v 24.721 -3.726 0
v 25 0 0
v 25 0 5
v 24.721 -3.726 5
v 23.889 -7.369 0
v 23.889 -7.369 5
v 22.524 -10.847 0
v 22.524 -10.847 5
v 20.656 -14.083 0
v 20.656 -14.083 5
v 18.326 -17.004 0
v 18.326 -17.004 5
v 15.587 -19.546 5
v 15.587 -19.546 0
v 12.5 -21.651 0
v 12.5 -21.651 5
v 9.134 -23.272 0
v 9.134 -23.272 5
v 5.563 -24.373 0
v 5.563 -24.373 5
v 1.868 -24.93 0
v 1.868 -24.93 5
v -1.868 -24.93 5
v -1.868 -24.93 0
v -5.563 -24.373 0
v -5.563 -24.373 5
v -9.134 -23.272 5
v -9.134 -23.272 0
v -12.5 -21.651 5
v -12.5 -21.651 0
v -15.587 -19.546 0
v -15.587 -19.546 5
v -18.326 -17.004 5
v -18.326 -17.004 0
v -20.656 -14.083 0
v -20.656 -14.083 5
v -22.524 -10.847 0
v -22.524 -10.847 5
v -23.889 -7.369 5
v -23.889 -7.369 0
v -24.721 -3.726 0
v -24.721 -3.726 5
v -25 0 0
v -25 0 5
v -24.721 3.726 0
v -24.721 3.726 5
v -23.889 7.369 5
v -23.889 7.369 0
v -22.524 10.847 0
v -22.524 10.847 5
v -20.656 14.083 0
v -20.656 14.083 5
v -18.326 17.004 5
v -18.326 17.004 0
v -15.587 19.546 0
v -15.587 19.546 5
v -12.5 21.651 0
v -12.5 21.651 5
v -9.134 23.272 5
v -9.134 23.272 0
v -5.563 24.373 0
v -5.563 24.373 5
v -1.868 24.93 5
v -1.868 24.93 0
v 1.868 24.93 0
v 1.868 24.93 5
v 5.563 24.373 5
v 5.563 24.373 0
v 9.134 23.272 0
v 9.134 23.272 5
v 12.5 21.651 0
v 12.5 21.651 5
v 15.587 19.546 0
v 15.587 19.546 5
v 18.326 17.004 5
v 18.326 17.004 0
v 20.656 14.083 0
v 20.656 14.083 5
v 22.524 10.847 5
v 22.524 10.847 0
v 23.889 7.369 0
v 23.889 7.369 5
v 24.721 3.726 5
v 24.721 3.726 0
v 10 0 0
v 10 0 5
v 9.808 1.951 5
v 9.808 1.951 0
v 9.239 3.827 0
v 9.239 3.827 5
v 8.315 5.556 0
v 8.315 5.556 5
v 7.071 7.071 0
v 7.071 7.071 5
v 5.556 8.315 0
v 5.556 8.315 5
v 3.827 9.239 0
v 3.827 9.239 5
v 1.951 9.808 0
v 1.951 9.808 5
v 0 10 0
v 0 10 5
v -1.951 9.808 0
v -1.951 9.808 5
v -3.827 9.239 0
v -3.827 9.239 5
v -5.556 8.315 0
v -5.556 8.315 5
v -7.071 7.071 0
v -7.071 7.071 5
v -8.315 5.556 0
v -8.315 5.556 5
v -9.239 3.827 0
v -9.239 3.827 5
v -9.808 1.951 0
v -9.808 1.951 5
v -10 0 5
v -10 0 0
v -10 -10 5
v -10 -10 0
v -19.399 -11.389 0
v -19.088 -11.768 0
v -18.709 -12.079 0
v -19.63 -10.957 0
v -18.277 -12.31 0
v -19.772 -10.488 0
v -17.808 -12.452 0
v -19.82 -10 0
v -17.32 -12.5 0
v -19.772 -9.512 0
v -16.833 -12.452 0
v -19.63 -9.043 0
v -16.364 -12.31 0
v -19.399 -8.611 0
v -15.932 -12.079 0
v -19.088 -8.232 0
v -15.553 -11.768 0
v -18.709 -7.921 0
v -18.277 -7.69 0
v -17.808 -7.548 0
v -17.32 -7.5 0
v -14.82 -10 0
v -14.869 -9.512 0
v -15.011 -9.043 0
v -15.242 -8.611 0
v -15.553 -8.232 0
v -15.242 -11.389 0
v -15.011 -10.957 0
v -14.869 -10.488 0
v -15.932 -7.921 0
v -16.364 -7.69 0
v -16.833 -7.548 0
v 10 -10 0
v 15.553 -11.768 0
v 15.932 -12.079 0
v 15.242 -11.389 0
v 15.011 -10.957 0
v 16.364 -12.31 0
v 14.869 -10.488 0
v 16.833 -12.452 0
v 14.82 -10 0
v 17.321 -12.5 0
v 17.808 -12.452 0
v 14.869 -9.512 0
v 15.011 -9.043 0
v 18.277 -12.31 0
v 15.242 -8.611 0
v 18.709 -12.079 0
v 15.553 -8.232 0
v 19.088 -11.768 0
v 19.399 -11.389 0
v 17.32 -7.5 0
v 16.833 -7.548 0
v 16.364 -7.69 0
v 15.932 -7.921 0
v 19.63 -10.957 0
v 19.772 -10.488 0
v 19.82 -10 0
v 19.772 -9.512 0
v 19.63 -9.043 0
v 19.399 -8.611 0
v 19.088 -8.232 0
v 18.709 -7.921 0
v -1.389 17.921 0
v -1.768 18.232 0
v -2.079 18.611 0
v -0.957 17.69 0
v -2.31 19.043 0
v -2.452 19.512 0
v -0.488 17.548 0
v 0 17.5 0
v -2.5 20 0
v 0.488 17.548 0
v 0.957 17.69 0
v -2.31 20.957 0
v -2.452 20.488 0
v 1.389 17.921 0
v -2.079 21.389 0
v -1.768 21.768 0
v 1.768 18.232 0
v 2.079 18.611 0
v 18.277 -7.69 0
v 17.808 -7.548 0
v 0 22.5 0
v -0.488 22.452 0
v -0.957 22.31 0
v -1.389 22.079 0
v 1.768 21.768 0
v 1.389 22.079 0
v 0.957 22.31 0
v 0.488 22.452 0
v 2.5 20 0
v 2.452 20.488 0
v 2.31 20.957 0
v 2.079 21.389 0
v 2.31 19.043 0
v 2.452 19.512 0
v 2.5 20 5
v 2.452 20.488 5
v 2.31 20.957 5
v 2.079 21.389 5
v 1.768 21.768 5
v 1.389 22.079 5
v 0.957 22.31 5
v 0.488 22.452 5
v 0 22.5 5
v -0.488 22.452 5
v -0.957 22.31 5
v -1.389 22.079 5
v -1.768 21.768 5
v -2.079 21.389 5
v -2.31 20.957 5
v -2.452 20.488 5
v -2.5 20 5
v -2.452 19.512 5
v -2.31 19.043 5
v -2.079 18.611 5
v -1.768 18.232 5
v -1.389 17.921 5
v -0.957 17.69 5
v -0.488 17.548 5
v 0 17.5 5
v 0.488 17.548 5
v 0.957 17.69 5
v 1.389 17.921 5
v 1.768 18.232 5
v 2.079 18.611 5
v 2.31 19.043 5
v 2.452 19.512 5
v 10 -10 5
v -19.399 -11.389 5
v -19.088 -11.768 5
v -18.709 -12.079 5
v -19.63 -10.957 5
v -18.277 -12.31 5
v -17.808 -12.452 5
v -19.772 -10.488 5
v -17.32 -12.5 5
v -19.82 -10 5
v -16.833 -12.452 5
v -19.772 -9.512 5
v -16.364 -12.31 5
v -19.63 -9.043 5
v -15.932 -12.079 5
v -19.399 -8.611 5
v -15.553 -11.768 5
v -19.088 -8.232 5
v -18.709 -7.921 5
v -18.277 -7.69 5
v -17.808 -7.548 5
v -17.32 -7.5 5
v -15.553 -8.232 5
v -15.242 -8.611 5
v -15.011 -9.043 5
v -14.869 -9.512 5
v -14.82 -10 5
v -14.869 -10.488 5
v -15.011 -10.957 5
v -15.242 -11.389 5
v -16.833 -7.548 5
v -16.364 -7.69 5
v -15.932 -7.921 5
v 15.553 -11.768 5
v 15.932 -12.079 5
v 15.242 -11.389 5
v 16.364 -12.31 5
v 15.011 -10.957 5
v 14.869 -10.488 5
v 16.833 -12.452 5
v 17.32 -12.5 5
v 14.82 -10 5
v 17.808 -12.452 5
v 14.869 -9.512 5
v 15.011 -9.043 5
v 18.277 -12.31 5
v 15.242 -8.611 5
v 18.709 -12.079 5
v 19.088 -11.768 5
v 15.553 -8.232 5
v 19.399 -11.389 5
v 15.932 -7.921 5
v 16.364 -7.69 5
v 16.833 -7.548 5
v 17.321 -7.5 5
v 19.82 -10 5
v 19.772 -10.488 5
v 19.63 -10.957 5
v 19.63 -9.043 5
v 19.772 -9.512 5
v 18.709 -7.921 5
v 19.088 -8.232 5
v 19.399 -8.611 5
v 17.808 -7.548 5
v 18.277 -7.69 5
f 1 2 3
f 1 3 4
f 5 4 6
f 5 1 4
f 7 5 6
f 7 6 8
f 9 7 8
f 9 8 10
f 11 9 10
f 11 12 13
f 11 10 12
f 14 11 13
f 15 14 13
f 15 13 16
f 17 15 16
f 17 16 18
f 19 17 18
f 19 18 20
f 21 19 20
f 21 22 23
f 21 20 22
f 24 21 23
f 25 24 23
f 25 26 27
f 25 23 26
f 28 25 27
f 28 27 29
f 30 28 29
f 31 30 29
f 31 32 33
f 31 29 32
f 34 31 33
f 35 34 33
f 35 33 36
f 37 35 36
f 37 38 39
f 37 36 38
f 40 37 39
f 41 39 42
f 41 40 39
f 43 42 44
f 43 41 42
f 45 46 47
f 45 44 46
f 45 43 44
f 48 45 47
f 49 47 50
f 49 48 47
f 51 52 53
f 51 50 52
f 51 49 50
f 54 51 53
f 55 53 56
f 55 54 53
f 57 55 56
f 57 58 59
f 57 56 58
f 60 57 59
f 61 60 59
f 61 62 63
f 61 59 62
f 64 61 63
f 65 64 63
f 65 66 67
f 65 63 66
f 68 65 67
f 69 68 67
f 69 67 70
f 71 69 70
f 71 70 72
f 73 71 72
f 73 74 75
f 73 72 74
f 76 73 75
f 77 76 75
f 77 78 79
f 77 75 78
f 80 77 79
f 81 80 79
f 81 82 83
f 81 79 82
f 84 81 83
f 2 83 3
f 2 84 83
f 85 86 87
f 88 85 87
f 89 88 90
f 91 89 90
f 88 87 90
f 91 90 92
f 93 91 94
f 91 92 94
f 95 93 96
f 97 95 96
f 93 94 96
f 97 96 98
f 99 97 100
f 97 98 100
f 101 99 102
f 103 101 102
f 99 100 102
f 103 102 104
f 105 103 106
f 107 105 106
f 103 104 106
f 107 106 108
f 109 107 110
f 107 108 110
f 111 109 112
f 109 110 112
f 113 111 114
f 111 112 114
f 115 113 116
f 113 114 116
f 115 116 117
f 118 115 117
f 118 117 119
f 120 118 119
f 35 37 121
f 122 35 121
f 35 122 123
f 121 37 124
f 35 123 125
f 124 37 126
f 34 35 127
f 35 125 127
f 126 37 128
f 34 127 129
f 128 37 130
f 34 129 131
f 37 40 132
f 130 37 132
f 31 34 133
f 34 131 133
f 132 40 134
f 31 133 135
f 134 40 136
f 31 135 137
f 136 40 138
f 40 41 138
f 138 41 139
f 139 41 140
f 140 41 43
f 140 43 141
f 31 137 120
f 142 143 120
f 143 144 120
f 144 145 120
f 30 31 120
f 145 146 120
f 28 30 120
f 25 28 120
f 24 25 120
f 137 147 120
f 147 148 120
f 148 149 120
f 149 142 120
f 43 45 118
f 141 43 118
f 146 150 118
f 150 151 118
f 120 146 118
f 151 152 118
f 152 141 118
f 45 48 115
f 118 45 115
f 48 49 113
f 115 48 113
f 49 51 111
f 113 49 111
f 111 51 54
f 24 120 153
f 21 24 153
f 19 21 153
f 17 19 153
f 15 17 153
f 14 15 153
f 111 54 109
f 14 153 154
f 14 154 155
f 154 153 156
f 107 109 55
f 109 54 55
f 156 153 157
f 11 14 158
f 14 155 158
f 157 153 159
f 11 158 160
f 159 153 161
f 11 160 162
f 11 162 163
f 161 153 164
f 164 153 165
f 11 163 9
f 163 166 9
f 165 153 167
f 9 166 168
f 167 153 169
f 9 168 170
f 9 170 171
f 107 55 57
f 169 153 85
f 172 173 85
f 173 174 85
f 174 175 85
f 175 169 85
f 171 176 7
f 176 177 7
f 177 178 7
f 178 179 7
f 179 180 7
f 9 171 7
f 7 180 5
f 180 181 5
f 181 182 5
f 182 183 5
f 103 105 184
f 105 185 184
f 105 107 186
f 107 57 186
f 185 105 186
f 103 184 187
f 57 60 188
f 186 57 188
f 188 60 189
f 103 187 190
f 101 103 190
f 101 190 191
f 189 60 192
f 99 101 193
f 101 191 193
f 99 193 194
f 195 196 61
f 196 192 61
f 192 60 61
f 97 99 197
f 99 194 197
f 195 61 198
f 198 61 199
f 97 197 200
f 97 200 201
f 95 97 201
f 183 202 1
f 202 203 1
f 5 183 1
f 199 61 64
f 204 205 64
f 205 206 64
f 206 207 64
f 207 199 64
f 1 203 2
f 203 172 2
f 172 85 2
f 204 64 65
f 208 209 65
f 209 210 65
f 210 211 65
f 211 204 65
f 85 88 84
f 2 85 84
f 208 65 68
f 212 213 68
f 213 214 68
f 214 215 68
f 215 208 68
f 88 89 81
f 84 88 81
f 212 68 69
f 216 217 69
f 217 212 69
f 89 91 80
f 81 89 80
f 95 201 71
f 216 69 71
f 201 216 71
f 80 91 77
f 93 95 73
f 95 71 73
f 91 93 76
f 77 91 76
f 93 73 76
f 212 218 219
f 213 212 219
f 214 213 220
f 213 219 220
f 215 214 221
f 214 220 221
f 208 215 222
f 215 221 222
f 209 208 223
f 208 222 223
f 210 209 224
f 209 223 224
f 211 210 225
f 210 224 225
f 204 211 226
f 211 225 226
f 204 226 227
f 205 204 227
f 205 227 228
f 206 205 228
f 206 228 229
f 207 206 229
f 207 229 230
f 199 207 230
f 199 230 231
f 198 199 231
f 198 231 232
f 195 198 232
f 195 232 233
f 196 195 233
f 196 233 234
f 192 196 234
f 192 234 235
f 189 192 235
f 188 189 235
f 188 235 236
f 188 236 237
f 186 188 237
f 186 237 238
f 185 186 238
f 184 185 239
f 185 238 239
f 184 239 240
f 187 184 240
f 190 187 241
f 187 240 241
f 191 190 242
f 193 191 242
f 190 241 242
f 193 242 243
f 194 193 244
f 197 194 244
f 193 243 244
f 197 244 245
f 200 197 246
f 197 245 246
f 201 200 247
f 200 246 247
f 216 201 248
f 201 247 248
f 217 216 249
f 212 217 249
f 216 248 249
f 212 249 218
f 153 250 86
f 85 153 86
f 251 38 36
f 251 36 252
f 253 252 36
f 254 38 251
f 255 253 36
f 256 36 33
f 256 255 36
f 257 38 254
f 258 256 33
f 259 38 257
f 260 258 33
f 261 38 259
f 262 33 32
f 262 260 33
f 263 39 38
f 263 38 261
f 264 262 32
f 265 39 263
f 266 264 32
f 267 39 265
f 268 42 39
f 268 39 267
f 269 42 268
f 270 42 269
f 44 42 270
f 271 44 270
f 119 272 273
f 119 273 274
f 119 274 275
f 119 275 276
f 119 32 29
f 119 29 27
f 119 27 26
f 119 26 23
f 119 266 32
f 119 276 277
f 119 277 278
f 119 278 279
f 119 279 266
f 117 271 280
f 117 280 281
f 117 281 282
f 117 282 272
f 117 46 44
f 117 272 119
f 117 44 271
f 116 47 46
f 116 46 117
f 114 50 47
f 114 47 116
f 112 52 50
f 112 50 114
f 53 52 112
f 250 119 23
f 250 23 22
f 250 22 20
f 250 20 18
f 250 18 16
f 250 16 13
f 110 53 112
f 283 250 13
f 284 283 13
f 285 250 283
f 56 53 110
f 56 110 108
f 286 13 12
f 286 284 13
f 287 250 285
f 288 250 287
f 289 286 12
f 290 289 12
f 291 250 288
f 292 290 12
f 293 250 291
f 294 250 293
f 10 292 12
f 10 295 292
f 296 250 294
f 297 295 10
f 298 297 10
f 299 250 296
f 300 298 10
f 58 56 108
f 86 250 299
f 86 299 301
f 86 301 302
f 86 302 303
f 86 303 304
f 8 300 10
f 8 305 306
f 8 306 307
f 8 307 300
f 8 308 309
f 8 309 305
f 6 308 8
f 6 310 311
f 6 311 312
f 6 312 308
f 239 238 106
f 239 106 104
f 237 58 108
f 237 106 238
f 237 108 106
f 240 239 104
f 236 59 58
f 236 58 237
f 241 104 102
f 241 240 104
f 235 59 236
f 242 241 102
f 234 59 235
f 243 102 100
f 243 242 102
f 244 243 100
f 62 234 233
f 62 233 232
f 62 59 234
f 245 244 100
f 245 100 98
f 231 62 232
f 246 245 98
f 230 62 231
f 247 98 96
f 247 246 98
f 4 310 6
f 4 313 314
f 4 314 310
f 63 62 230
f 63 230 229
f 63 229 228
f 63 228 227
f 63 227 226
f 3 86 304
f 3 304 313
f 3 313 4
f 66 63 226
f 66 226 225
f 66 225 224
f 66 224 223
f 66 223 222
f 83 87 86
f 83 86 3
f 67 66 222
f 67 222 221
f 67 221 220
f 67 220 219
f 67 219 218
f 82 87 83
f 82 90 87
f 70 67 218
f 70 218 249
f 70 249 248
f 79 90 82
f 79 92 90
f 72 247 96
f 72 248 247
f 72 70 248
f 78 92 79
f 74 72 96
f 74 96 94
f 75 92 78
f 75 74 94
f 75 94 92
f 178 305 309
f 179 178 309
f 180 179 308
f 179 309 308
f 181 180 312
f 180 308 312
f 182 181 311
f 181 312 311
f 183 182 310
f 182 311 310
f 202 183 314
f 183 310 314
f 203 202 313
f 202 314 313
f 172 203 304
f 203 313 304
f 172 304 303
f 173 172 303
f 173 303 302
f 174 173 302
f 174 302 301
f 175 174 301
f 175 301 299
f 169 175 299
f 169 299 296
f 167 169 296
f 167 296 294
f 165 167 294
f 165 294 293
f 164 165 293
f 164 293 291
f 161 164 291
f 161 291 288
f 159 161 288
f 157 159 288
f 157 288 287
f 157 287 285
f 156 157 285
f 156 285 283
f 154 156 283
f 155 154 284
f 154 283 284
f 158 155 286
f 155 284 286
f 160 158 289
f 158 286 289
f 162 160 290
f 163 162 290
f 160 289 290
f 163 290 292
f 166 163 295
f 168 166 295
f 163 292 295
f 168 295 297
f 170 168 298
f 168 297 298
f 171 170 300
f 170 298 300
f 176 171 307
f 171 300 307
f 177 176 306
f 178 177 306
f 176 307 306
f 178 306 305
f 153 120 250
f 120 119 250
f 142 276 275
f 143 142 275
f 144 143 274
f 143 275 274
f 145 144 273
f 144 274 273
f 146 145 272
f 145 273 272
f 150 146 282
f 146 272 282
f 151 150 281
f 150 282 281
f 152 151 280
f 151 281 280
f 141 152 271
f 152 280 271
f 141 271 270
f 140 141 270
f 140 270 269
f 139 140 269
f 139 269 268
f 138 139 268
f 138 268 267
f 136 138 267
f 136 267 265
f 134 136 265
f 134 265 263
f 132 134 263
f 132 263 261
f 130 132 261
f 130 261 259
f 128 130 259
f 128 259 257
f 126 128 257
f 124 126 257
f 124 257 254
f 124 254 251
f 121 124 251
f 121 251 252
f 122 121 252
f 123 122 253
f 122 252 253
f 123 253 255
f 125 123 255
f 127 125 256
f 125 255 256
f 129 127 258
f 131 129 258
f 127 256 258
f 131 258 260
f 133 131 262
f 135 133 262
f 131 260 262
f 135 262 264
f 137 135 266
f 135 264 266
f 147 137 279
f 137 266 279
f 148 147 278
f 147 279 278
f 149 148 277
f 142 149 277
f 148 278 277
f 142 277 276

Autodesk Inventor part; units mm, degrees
ref_plane "YZ Plane" through (0, 0, 0) normal (1, 0, 0) x (0, 1, 0)
ref_plane "XZ Plane" through (0, 0, 0) normal (0, 1, 0) x (-1, 0, 0)
ref_plane "XY Plane" through (0, 0, 0) normal (0, 0, 1) x (1, 0, 0)
sketch "草图1" plane through (0, 0, 0) normal (0, 0, 1) x (1, 0, 0)
  circle A0 centre (0, 0) radius 25
  dimension "d0" = 50
extrude "拉伸1" add sketch "草图1" along normal blind 5
sketch "草图2" plane through (0, 0, 5) normal (0, 0, 1) x (1, 0, 0)
  circle A0 centre (0, 0) radius 10
  line L0 (-10, 0) -> (-10, -10)
  line L1 (-10, -10) -> (10, -10)
  line L2 (10, -10) -> (10, 0)
  dimension "d3" = 20
extrude "拉伸2" cut sketch "草图2" against normal through all
sketch "草图3" plane through (0, 0, 5) normal (0, 0, 1) x (1, 0, 0)
  circle A0 centre (-17.3205, -10) radius 2.5
  circle A1 centre (17.3205, -10) radius 2.5
  circle A2 centre (0, 20) radius 2.5
  line L0 (0, 0) -> (0, 20)
  line L1 (0, 0) -> (-17.3205, -10)
  line L2 (0, 0) -> (17.3205, -10)
  dimension "d6" = 5
  dimension "d7" = 5
  dimension "d8" = 5
  dimension "d9" = 20
  dimension "d10" = 120
  dimension "d11" = 120
extrude "拉伸3" cut sketch "草图3" against normal through all
properties part number "刀夹片"
